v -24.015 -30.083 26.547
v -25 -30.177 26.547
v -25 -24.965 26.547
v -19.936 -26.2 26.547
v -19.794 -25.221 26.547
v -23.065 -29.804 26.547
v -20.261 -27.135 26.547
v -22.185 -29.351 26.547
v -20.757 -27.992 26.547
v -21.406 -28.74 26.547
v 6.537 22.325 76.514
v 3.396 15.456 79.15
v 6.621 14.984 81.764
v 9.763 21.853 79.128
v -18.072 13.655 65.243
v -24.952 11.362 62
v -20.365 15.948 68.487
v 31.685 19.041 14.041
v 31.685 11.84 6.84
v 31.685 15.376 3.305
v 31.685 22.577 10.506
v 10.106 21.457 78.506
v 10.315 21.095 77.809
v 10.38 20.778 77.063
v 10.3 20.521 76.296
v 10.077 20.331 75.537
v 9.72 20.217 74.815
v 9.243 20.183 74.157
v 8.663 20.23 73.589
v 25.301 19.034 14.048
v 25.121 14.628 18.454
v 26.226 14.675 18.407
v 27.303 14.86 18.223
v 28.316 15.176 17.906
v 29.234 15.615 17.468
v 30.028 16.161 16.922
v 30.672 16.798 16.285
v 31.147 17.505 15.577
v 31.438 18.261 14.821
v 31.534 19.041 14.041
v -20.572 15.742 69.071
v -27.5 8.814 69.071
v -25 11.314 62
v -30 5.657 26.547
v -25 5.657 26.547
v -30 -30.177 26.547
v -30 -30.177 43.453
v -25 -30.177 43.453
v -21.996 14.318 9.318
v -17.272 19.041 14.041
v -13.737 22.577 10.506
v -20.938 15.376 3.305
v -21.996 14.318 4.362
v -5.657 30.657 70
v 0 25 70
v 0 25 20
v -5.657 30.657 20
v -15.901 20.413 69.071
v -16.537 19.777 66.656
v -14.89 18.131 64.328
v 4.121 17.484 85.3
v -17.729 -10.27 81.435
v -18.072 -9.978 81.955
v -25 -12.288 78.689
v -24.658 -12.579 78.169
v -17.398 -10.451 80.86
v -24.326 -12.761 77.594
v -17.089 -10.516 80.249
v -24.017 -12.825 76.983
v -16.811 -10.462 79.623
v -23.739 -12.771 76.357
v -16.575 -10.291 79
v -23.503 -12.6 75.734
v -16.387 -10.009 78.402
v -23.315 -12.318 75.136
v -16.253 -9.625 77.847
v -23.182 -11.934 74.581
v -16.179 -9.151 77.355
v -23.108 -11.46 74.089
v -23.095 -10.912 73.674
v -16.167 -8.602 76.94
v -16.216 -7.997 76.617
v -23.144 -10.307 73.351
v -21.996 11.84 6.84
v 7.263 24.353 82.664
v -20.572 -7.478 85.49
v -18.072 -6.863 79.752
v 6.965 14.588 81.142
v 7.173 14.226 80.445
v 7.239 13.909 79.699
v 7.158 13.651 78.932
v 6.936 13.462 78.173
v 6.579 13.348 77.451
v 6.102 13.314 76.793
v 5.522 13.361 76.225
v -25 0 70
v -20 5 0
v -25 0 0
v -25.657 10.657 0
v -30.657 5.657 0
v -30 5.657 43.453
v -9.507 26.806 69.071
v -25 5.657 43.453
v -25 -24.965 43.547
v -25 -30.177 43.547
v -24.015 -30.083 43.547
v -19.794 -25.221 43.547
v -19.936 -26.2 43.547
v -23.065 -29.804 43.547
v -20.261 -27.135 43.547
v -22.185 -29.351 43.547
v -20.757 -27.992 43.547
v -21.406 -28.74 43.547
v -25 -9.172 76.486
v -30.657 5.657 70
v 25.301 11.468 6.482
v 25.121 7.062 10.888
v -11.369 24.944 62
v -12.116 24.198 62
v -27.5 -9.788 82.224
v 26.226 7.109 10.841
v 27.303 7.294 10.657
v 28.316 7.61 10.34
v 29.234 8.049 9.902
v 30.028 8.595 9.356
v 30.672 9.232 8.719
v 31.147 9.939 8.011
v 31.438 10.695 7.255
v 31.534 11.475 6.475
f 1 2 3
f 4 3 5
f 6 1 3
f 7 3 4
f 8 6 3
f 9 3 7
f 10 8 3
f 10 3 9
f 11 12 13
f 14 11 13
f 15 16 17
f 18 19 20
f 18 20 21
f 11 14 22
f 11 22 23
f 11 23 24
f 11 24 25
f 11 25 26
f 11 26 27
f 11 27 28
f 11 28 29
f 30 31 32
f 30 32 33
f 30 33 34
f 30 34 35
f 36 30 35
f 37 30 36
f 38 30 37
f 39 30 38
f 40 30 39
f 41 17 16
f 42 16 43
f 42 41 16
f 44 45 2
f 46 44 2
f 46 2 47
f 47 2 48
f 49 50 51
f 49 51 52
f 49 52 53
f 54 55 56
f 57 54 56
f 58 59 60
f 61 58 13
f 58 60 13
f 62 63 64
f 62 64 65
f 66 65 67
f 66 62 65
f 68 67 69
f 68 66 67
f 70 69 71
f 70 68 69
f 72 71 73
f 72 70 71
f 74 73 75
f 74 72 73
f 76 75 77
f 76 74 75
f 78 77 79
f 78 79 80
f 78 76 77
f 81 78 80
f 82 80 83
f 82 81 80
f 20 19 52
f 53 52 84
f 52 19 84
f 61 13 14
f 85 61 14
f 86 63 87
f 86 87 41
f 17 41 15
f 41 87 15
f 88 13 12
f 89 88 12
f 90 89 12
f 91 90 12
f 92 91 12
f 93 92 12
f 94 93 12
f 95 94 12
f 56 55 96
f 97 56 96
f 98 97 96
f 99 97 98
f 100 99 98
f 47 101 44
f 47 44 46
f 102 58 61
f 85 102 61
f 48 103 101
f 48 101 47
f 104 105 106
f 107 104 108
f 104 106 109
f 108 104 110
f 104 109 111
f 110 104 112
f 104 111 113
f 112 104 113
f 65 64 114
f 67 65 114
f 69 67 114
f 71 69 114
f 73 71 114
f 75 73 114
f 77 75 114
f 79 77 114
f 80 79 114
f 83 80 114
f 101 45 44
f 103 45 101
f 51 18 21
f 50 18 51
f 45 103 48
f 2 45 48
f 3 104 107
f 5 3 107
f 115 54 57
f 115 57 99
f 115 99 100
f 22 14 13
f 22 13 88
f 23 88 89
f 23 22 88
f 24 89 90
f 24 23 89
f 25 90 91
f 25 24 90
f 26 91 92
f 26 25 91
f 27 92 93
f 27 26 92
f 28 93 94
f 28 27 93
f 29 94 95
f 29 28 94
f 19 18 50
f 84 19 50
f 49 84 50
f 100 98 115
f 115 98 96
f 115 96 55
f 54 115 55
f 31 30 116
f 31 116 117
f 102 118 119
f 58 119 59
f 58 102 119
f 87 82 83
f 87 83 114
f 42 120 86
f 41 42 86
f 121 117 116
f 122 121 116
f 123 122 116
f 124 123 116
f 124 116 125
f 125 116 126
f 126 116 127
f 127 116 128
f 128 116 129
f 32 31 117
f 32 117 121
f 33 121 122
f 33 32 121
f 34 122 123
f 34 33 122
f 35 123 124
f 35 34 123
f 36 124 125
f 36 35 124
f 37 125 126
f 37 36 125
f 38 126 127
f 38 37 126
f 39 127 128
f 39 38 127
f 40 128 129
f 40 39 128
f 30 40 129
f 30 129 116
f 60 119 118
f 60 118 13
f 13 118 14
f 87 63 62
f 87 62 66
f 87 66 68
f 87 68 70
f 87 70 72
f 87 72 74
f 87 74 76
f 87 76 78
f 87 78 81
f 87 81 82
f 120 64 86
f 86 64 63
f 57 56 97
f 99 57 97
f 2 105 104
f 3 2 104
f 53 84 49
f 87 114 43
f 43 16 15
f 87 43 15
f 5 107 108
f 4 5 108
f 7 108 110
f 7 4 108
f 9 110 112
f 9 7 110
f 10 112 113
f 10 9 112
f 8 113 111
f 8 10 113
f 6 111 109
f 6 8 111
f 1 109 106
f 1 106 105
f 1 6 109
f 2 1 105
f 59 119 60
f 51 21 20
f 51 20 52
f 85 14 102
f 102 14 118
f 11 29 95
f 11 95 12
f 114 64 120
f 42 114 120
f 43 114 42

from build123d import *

# Parameters (mm, degrees)
F0_W      = 50
F0_H      = 50
F1_DEPTH  = 80
F2_SIZE2  = 23.8350718519
F2_SIZE   = 20
F3_SIZE   = 25
F4_SIZE   = 10
F5_SIZE   = 20
F9_DEPTH  = 8
F13_W     = 35.8339243103
F13_H     = 16.9060602784
F14_DEPTH = 5
F17_W     = 53.6813121289
F17_H     = 10.183953287
F18_DEPTH = 5
F20_DEPTH = 17
F22_DEPTH = 17.6786695297
F24_DEPTH = 10.7
F25_W     = 8
F25_H     = 28.9447009563
F26_DEPTH = 5
F28_DEPTH = 8
F30_DEPTH = 8
F32_W     = 53.8588166237
F32_H     = 78.8521182258
F33_DEPTH = 25


with BuildPart() as f1:
    # F0 (on Top) → F1 (new body)
    with BuildSketch(Plane.XY):
        Rectangle(F0_W, F0_H)
    extrude(amount=F1_DEPTH)

    # F2
    f2_edges = [f1.edges().sort_by_distance(p)[0] for p in [
        (25, -25, 40),
        (25, 0, 80),
        (0, -25, 80),
    ]]
    chamfer(f2_edges, length=F2_SIZE, length2=F2_SIZE2)

    # F3
    f3_edges = [f1.edges().sort_by_distance(p)[0] for p in [
        (-25, 25, 40),
    ]]
    chamfer(f3_edges, length=F3_SIZE)

    # F4
    f4_edges = [f1.edges().sort_by_distance(p)[0] for p in [
        (-12.5, 12.5, 80),
    ]]
    chamfer(f4_edges, length=F4_SIZE)

    # F5
    f5_edges = [f1.edges().sort_by_distance(p)[0] for p in [
        (12.5, 25, 0),
        (-10, -25, 0),
    ]]
    chamfer(f5_edges, length=F5_SIZE)


with BuildPart() as f9:
    # F8 (on offset) → F9 (new body)
    with BuildSketch(Plane(origin=(-12.5, 12.5, 0), x_dir=(-0.7071067812, -0.7071067812, 0), z_dir=(-0.7071067812, 0.7071067812, 0))):
        Polygon((17.6776695297, 0), (17.6776695297, 70), (-17.6776695297, 70), (-17.6776695297, 20), (10.6066017178, 0), align=None)
    extrude(amount=F9_DEPTH)


with BuildPart() as f14:
    # F13 (on offset) → F14 (new body)
    with BuildSketch(Plane(origin=(-25, 0, 0), x_dir=(0, -1, 0), z_dir=(-1, 0, 0))):
        with Locations((12.2601079056, 35)):
            Rectangle(F13_W, F13_H)
    extrude(amount=F14_DEPTH)


with BuildPart() as f18:
    # F17 (on face) → F18 (new body)
    with BuildSketch(Plane(origin=(0, 2.5, -2.5), x_dir=(-1, 0, 0), z_dir=(0, 0.7071067812, -0.7071067812))):
        with Locations((-4.8447521403, 18.300923788)):
            Rectangle(F17_W, F17_H)
    extrude(amount=F18_DEPTH)

    # F21 (on face) → F22 (cut, through all)
    with BuildSketch(Plane(origin=(-18.1568542495, 18.1568542495, 0), x_dir=(-0.7071067812, -0.7071067812, 0), z_dir=(-0.7071067812, 0.7071067812, 0))):
        Polygon((-6.8858577405, 12.3690367026), (6.4172865124, 2.9622931903), (4.3216864578, 20), align=None)
    extrude(amount=F22_DEPTH, mode=Mode.SUBTRACT)


with BuildPart() as f20:
    # F19 (on face) → F20 (new body)
    with BuildSketch(Plane(origin=(0, 0, 26.5469698608), x_dir=(1, 0, 0), z_dir=(0, 0, -1))):
        with BuildLine():
            Line((-25, 24.9648671597), (-19.794074714, 25.2206033486))
            ThreePointArc((-19.794074714, 25.2206033486), (-21.4059695204, 28.7397849064), (-25, 30.1770700608))
            Line((-25, 30.1770700608), (-25, 24.9648671597))
        make_face()
    extrude(amount=-F20_DEPTH)


with BuildPart() as f24:
    # F23 (on face) → F24 (new body)
    with BuildSketch(Plane(origin=(0, 16.5412785267, 16.5412785267), x_dir=(1, 0, 0), z_dir=(0, 0.7071067812, 0.7071067812))):
        with BuildLine():
            Line((25.3005823628, 3.5255805781), (25.1206550747, -2.7054911479))
            ThreePointArc((25.1206550747, -2.7054911479), (29.6479403457, -0.9419810894), (31.5342433751, 3.5355339059))
            Line((31.5342433751, 3.5355339059), (25.3005823628, 3.5255805781))
        make_face()
    extrude(amount=-F24_DEPTH)


with BuildPart() as f26:
    # F25 (on face) → F26 (new body)
    with BuildSketch(Plane(origin=(-30.9987373415, 30.9987373415, 43.8388347648), x_dir=(0.8660254038, 0.2886751346, 0.4082482905), z_dir=(-0.5, 0.5, 0.7071067812))):
        with Locations((10.9267452379, -40.9913770854)):
            Rectangle(F25_W, F25_H)
    extrude(amount=F26_DEPTH)

    # F29 (on face) → F30 (join)
    with BuildSketch(Plane(origin=(12.9269405718, 4.3089801906, 6.0938182255), x_dir=(-0.2611164839, 0.9574271078, -0.123091491), z_dir=(0.8660254038, 0.2886751346, 0.4082482905))):
        with BuildLine():
            Line((-11.6683227199, 79.8438422851), (-14.9225005893, 81.8366111132))
            ThreePointArc((-14.9225005893, 81.8366111132), (-15.2492461331, 78.5255901405), (-12.8536503762, 76.2167498469))
            Line((-12.8536503762, 76.2167498469), (-11.6683227199, 79.8438422851))
        make_face()
    extrude(amount=-F30_DEPTH)


with BuildPart() as f26b:
    # F25 (on face) → F26, piece 2 (new body)
    with BuildSketch(Plane(origin=(-30.9987373415, 30.9987373415, 43.8388347648), x_dir=(0.8660254038, 0.2886751346, 0.4082482905), z_dir=(-0.5, 0.5, 0.7071067812))):
        Polygon((22.2276340141, -15.2055781644), (18.600326423, -22.3359806523), (43.4397284504, -34.972034744), (47.0670360415, -27.8416322561), align=None)
    extrude(amount=F26_DEPTH)


with BuildPart() as f28:
    # F27 (on face) → F28 (new body)
    with BuildSketch(Plane(origin=(-1.3642953196, -2.9832582966, 1.1447796995), x_dir=(-0.9196804789, 0.366602615, -0.1406781411), z_dir=(0.3926675652, 0.8586328449, -0.3294872091))):
        with BuildLine():
            Line((-8.5912431992, 79.4330683637), (-12.0985571904, 81.7049722909))
            ThreePointArc((-12.0985571904, 81.7049722909), (-12.6827022712, 78.5829145248), (-10.9031619504, 75.952000916))
            Line((-10.9031619504, 75.952000916), (-8.5912431992, 79.4330683637))
        make_face()
    extrude(amount=-F28_DEPTH)


with BuildPart() as f33_tool:
    # F32 (on face) → F33 (new body)
    with BuildSketch(Plane(origin=(-18.1568542495, 18.1568542495, 0), x_dir=(-0.7071067812, -0.7071067812, 0), z_dir=(-0.7071067812, 0.7071067812, 0))):
        with Locations((-1.6720835119, 35.6160321971)):
            Rectangle(F32_W, F32_H)
    extrude(amount=F33_DEPTH)


with BuildPart() as f18_1:
    add(f18.part)

    # F33: cut by f33_tool
    add(f33_tool.part, mode=Mode.SUBTRACT)


with BuildPart() as f26_1:
    add(f26.part)

    # F33: cut by f33_tool
    add(f33_tool.part, mode=Mode.SUBTRACT)


with BuildPart() as f26b_1:
    add(f26b.part)

    # F33: cut by f33_tool
    add(f33_tool.part, mode=Mode.SUBTRACT)


solid = Compound([f9.part, f14.part, f20.part, f24.part, f28.part, f18_1.part, f26_1.part, f26b_1.part])
